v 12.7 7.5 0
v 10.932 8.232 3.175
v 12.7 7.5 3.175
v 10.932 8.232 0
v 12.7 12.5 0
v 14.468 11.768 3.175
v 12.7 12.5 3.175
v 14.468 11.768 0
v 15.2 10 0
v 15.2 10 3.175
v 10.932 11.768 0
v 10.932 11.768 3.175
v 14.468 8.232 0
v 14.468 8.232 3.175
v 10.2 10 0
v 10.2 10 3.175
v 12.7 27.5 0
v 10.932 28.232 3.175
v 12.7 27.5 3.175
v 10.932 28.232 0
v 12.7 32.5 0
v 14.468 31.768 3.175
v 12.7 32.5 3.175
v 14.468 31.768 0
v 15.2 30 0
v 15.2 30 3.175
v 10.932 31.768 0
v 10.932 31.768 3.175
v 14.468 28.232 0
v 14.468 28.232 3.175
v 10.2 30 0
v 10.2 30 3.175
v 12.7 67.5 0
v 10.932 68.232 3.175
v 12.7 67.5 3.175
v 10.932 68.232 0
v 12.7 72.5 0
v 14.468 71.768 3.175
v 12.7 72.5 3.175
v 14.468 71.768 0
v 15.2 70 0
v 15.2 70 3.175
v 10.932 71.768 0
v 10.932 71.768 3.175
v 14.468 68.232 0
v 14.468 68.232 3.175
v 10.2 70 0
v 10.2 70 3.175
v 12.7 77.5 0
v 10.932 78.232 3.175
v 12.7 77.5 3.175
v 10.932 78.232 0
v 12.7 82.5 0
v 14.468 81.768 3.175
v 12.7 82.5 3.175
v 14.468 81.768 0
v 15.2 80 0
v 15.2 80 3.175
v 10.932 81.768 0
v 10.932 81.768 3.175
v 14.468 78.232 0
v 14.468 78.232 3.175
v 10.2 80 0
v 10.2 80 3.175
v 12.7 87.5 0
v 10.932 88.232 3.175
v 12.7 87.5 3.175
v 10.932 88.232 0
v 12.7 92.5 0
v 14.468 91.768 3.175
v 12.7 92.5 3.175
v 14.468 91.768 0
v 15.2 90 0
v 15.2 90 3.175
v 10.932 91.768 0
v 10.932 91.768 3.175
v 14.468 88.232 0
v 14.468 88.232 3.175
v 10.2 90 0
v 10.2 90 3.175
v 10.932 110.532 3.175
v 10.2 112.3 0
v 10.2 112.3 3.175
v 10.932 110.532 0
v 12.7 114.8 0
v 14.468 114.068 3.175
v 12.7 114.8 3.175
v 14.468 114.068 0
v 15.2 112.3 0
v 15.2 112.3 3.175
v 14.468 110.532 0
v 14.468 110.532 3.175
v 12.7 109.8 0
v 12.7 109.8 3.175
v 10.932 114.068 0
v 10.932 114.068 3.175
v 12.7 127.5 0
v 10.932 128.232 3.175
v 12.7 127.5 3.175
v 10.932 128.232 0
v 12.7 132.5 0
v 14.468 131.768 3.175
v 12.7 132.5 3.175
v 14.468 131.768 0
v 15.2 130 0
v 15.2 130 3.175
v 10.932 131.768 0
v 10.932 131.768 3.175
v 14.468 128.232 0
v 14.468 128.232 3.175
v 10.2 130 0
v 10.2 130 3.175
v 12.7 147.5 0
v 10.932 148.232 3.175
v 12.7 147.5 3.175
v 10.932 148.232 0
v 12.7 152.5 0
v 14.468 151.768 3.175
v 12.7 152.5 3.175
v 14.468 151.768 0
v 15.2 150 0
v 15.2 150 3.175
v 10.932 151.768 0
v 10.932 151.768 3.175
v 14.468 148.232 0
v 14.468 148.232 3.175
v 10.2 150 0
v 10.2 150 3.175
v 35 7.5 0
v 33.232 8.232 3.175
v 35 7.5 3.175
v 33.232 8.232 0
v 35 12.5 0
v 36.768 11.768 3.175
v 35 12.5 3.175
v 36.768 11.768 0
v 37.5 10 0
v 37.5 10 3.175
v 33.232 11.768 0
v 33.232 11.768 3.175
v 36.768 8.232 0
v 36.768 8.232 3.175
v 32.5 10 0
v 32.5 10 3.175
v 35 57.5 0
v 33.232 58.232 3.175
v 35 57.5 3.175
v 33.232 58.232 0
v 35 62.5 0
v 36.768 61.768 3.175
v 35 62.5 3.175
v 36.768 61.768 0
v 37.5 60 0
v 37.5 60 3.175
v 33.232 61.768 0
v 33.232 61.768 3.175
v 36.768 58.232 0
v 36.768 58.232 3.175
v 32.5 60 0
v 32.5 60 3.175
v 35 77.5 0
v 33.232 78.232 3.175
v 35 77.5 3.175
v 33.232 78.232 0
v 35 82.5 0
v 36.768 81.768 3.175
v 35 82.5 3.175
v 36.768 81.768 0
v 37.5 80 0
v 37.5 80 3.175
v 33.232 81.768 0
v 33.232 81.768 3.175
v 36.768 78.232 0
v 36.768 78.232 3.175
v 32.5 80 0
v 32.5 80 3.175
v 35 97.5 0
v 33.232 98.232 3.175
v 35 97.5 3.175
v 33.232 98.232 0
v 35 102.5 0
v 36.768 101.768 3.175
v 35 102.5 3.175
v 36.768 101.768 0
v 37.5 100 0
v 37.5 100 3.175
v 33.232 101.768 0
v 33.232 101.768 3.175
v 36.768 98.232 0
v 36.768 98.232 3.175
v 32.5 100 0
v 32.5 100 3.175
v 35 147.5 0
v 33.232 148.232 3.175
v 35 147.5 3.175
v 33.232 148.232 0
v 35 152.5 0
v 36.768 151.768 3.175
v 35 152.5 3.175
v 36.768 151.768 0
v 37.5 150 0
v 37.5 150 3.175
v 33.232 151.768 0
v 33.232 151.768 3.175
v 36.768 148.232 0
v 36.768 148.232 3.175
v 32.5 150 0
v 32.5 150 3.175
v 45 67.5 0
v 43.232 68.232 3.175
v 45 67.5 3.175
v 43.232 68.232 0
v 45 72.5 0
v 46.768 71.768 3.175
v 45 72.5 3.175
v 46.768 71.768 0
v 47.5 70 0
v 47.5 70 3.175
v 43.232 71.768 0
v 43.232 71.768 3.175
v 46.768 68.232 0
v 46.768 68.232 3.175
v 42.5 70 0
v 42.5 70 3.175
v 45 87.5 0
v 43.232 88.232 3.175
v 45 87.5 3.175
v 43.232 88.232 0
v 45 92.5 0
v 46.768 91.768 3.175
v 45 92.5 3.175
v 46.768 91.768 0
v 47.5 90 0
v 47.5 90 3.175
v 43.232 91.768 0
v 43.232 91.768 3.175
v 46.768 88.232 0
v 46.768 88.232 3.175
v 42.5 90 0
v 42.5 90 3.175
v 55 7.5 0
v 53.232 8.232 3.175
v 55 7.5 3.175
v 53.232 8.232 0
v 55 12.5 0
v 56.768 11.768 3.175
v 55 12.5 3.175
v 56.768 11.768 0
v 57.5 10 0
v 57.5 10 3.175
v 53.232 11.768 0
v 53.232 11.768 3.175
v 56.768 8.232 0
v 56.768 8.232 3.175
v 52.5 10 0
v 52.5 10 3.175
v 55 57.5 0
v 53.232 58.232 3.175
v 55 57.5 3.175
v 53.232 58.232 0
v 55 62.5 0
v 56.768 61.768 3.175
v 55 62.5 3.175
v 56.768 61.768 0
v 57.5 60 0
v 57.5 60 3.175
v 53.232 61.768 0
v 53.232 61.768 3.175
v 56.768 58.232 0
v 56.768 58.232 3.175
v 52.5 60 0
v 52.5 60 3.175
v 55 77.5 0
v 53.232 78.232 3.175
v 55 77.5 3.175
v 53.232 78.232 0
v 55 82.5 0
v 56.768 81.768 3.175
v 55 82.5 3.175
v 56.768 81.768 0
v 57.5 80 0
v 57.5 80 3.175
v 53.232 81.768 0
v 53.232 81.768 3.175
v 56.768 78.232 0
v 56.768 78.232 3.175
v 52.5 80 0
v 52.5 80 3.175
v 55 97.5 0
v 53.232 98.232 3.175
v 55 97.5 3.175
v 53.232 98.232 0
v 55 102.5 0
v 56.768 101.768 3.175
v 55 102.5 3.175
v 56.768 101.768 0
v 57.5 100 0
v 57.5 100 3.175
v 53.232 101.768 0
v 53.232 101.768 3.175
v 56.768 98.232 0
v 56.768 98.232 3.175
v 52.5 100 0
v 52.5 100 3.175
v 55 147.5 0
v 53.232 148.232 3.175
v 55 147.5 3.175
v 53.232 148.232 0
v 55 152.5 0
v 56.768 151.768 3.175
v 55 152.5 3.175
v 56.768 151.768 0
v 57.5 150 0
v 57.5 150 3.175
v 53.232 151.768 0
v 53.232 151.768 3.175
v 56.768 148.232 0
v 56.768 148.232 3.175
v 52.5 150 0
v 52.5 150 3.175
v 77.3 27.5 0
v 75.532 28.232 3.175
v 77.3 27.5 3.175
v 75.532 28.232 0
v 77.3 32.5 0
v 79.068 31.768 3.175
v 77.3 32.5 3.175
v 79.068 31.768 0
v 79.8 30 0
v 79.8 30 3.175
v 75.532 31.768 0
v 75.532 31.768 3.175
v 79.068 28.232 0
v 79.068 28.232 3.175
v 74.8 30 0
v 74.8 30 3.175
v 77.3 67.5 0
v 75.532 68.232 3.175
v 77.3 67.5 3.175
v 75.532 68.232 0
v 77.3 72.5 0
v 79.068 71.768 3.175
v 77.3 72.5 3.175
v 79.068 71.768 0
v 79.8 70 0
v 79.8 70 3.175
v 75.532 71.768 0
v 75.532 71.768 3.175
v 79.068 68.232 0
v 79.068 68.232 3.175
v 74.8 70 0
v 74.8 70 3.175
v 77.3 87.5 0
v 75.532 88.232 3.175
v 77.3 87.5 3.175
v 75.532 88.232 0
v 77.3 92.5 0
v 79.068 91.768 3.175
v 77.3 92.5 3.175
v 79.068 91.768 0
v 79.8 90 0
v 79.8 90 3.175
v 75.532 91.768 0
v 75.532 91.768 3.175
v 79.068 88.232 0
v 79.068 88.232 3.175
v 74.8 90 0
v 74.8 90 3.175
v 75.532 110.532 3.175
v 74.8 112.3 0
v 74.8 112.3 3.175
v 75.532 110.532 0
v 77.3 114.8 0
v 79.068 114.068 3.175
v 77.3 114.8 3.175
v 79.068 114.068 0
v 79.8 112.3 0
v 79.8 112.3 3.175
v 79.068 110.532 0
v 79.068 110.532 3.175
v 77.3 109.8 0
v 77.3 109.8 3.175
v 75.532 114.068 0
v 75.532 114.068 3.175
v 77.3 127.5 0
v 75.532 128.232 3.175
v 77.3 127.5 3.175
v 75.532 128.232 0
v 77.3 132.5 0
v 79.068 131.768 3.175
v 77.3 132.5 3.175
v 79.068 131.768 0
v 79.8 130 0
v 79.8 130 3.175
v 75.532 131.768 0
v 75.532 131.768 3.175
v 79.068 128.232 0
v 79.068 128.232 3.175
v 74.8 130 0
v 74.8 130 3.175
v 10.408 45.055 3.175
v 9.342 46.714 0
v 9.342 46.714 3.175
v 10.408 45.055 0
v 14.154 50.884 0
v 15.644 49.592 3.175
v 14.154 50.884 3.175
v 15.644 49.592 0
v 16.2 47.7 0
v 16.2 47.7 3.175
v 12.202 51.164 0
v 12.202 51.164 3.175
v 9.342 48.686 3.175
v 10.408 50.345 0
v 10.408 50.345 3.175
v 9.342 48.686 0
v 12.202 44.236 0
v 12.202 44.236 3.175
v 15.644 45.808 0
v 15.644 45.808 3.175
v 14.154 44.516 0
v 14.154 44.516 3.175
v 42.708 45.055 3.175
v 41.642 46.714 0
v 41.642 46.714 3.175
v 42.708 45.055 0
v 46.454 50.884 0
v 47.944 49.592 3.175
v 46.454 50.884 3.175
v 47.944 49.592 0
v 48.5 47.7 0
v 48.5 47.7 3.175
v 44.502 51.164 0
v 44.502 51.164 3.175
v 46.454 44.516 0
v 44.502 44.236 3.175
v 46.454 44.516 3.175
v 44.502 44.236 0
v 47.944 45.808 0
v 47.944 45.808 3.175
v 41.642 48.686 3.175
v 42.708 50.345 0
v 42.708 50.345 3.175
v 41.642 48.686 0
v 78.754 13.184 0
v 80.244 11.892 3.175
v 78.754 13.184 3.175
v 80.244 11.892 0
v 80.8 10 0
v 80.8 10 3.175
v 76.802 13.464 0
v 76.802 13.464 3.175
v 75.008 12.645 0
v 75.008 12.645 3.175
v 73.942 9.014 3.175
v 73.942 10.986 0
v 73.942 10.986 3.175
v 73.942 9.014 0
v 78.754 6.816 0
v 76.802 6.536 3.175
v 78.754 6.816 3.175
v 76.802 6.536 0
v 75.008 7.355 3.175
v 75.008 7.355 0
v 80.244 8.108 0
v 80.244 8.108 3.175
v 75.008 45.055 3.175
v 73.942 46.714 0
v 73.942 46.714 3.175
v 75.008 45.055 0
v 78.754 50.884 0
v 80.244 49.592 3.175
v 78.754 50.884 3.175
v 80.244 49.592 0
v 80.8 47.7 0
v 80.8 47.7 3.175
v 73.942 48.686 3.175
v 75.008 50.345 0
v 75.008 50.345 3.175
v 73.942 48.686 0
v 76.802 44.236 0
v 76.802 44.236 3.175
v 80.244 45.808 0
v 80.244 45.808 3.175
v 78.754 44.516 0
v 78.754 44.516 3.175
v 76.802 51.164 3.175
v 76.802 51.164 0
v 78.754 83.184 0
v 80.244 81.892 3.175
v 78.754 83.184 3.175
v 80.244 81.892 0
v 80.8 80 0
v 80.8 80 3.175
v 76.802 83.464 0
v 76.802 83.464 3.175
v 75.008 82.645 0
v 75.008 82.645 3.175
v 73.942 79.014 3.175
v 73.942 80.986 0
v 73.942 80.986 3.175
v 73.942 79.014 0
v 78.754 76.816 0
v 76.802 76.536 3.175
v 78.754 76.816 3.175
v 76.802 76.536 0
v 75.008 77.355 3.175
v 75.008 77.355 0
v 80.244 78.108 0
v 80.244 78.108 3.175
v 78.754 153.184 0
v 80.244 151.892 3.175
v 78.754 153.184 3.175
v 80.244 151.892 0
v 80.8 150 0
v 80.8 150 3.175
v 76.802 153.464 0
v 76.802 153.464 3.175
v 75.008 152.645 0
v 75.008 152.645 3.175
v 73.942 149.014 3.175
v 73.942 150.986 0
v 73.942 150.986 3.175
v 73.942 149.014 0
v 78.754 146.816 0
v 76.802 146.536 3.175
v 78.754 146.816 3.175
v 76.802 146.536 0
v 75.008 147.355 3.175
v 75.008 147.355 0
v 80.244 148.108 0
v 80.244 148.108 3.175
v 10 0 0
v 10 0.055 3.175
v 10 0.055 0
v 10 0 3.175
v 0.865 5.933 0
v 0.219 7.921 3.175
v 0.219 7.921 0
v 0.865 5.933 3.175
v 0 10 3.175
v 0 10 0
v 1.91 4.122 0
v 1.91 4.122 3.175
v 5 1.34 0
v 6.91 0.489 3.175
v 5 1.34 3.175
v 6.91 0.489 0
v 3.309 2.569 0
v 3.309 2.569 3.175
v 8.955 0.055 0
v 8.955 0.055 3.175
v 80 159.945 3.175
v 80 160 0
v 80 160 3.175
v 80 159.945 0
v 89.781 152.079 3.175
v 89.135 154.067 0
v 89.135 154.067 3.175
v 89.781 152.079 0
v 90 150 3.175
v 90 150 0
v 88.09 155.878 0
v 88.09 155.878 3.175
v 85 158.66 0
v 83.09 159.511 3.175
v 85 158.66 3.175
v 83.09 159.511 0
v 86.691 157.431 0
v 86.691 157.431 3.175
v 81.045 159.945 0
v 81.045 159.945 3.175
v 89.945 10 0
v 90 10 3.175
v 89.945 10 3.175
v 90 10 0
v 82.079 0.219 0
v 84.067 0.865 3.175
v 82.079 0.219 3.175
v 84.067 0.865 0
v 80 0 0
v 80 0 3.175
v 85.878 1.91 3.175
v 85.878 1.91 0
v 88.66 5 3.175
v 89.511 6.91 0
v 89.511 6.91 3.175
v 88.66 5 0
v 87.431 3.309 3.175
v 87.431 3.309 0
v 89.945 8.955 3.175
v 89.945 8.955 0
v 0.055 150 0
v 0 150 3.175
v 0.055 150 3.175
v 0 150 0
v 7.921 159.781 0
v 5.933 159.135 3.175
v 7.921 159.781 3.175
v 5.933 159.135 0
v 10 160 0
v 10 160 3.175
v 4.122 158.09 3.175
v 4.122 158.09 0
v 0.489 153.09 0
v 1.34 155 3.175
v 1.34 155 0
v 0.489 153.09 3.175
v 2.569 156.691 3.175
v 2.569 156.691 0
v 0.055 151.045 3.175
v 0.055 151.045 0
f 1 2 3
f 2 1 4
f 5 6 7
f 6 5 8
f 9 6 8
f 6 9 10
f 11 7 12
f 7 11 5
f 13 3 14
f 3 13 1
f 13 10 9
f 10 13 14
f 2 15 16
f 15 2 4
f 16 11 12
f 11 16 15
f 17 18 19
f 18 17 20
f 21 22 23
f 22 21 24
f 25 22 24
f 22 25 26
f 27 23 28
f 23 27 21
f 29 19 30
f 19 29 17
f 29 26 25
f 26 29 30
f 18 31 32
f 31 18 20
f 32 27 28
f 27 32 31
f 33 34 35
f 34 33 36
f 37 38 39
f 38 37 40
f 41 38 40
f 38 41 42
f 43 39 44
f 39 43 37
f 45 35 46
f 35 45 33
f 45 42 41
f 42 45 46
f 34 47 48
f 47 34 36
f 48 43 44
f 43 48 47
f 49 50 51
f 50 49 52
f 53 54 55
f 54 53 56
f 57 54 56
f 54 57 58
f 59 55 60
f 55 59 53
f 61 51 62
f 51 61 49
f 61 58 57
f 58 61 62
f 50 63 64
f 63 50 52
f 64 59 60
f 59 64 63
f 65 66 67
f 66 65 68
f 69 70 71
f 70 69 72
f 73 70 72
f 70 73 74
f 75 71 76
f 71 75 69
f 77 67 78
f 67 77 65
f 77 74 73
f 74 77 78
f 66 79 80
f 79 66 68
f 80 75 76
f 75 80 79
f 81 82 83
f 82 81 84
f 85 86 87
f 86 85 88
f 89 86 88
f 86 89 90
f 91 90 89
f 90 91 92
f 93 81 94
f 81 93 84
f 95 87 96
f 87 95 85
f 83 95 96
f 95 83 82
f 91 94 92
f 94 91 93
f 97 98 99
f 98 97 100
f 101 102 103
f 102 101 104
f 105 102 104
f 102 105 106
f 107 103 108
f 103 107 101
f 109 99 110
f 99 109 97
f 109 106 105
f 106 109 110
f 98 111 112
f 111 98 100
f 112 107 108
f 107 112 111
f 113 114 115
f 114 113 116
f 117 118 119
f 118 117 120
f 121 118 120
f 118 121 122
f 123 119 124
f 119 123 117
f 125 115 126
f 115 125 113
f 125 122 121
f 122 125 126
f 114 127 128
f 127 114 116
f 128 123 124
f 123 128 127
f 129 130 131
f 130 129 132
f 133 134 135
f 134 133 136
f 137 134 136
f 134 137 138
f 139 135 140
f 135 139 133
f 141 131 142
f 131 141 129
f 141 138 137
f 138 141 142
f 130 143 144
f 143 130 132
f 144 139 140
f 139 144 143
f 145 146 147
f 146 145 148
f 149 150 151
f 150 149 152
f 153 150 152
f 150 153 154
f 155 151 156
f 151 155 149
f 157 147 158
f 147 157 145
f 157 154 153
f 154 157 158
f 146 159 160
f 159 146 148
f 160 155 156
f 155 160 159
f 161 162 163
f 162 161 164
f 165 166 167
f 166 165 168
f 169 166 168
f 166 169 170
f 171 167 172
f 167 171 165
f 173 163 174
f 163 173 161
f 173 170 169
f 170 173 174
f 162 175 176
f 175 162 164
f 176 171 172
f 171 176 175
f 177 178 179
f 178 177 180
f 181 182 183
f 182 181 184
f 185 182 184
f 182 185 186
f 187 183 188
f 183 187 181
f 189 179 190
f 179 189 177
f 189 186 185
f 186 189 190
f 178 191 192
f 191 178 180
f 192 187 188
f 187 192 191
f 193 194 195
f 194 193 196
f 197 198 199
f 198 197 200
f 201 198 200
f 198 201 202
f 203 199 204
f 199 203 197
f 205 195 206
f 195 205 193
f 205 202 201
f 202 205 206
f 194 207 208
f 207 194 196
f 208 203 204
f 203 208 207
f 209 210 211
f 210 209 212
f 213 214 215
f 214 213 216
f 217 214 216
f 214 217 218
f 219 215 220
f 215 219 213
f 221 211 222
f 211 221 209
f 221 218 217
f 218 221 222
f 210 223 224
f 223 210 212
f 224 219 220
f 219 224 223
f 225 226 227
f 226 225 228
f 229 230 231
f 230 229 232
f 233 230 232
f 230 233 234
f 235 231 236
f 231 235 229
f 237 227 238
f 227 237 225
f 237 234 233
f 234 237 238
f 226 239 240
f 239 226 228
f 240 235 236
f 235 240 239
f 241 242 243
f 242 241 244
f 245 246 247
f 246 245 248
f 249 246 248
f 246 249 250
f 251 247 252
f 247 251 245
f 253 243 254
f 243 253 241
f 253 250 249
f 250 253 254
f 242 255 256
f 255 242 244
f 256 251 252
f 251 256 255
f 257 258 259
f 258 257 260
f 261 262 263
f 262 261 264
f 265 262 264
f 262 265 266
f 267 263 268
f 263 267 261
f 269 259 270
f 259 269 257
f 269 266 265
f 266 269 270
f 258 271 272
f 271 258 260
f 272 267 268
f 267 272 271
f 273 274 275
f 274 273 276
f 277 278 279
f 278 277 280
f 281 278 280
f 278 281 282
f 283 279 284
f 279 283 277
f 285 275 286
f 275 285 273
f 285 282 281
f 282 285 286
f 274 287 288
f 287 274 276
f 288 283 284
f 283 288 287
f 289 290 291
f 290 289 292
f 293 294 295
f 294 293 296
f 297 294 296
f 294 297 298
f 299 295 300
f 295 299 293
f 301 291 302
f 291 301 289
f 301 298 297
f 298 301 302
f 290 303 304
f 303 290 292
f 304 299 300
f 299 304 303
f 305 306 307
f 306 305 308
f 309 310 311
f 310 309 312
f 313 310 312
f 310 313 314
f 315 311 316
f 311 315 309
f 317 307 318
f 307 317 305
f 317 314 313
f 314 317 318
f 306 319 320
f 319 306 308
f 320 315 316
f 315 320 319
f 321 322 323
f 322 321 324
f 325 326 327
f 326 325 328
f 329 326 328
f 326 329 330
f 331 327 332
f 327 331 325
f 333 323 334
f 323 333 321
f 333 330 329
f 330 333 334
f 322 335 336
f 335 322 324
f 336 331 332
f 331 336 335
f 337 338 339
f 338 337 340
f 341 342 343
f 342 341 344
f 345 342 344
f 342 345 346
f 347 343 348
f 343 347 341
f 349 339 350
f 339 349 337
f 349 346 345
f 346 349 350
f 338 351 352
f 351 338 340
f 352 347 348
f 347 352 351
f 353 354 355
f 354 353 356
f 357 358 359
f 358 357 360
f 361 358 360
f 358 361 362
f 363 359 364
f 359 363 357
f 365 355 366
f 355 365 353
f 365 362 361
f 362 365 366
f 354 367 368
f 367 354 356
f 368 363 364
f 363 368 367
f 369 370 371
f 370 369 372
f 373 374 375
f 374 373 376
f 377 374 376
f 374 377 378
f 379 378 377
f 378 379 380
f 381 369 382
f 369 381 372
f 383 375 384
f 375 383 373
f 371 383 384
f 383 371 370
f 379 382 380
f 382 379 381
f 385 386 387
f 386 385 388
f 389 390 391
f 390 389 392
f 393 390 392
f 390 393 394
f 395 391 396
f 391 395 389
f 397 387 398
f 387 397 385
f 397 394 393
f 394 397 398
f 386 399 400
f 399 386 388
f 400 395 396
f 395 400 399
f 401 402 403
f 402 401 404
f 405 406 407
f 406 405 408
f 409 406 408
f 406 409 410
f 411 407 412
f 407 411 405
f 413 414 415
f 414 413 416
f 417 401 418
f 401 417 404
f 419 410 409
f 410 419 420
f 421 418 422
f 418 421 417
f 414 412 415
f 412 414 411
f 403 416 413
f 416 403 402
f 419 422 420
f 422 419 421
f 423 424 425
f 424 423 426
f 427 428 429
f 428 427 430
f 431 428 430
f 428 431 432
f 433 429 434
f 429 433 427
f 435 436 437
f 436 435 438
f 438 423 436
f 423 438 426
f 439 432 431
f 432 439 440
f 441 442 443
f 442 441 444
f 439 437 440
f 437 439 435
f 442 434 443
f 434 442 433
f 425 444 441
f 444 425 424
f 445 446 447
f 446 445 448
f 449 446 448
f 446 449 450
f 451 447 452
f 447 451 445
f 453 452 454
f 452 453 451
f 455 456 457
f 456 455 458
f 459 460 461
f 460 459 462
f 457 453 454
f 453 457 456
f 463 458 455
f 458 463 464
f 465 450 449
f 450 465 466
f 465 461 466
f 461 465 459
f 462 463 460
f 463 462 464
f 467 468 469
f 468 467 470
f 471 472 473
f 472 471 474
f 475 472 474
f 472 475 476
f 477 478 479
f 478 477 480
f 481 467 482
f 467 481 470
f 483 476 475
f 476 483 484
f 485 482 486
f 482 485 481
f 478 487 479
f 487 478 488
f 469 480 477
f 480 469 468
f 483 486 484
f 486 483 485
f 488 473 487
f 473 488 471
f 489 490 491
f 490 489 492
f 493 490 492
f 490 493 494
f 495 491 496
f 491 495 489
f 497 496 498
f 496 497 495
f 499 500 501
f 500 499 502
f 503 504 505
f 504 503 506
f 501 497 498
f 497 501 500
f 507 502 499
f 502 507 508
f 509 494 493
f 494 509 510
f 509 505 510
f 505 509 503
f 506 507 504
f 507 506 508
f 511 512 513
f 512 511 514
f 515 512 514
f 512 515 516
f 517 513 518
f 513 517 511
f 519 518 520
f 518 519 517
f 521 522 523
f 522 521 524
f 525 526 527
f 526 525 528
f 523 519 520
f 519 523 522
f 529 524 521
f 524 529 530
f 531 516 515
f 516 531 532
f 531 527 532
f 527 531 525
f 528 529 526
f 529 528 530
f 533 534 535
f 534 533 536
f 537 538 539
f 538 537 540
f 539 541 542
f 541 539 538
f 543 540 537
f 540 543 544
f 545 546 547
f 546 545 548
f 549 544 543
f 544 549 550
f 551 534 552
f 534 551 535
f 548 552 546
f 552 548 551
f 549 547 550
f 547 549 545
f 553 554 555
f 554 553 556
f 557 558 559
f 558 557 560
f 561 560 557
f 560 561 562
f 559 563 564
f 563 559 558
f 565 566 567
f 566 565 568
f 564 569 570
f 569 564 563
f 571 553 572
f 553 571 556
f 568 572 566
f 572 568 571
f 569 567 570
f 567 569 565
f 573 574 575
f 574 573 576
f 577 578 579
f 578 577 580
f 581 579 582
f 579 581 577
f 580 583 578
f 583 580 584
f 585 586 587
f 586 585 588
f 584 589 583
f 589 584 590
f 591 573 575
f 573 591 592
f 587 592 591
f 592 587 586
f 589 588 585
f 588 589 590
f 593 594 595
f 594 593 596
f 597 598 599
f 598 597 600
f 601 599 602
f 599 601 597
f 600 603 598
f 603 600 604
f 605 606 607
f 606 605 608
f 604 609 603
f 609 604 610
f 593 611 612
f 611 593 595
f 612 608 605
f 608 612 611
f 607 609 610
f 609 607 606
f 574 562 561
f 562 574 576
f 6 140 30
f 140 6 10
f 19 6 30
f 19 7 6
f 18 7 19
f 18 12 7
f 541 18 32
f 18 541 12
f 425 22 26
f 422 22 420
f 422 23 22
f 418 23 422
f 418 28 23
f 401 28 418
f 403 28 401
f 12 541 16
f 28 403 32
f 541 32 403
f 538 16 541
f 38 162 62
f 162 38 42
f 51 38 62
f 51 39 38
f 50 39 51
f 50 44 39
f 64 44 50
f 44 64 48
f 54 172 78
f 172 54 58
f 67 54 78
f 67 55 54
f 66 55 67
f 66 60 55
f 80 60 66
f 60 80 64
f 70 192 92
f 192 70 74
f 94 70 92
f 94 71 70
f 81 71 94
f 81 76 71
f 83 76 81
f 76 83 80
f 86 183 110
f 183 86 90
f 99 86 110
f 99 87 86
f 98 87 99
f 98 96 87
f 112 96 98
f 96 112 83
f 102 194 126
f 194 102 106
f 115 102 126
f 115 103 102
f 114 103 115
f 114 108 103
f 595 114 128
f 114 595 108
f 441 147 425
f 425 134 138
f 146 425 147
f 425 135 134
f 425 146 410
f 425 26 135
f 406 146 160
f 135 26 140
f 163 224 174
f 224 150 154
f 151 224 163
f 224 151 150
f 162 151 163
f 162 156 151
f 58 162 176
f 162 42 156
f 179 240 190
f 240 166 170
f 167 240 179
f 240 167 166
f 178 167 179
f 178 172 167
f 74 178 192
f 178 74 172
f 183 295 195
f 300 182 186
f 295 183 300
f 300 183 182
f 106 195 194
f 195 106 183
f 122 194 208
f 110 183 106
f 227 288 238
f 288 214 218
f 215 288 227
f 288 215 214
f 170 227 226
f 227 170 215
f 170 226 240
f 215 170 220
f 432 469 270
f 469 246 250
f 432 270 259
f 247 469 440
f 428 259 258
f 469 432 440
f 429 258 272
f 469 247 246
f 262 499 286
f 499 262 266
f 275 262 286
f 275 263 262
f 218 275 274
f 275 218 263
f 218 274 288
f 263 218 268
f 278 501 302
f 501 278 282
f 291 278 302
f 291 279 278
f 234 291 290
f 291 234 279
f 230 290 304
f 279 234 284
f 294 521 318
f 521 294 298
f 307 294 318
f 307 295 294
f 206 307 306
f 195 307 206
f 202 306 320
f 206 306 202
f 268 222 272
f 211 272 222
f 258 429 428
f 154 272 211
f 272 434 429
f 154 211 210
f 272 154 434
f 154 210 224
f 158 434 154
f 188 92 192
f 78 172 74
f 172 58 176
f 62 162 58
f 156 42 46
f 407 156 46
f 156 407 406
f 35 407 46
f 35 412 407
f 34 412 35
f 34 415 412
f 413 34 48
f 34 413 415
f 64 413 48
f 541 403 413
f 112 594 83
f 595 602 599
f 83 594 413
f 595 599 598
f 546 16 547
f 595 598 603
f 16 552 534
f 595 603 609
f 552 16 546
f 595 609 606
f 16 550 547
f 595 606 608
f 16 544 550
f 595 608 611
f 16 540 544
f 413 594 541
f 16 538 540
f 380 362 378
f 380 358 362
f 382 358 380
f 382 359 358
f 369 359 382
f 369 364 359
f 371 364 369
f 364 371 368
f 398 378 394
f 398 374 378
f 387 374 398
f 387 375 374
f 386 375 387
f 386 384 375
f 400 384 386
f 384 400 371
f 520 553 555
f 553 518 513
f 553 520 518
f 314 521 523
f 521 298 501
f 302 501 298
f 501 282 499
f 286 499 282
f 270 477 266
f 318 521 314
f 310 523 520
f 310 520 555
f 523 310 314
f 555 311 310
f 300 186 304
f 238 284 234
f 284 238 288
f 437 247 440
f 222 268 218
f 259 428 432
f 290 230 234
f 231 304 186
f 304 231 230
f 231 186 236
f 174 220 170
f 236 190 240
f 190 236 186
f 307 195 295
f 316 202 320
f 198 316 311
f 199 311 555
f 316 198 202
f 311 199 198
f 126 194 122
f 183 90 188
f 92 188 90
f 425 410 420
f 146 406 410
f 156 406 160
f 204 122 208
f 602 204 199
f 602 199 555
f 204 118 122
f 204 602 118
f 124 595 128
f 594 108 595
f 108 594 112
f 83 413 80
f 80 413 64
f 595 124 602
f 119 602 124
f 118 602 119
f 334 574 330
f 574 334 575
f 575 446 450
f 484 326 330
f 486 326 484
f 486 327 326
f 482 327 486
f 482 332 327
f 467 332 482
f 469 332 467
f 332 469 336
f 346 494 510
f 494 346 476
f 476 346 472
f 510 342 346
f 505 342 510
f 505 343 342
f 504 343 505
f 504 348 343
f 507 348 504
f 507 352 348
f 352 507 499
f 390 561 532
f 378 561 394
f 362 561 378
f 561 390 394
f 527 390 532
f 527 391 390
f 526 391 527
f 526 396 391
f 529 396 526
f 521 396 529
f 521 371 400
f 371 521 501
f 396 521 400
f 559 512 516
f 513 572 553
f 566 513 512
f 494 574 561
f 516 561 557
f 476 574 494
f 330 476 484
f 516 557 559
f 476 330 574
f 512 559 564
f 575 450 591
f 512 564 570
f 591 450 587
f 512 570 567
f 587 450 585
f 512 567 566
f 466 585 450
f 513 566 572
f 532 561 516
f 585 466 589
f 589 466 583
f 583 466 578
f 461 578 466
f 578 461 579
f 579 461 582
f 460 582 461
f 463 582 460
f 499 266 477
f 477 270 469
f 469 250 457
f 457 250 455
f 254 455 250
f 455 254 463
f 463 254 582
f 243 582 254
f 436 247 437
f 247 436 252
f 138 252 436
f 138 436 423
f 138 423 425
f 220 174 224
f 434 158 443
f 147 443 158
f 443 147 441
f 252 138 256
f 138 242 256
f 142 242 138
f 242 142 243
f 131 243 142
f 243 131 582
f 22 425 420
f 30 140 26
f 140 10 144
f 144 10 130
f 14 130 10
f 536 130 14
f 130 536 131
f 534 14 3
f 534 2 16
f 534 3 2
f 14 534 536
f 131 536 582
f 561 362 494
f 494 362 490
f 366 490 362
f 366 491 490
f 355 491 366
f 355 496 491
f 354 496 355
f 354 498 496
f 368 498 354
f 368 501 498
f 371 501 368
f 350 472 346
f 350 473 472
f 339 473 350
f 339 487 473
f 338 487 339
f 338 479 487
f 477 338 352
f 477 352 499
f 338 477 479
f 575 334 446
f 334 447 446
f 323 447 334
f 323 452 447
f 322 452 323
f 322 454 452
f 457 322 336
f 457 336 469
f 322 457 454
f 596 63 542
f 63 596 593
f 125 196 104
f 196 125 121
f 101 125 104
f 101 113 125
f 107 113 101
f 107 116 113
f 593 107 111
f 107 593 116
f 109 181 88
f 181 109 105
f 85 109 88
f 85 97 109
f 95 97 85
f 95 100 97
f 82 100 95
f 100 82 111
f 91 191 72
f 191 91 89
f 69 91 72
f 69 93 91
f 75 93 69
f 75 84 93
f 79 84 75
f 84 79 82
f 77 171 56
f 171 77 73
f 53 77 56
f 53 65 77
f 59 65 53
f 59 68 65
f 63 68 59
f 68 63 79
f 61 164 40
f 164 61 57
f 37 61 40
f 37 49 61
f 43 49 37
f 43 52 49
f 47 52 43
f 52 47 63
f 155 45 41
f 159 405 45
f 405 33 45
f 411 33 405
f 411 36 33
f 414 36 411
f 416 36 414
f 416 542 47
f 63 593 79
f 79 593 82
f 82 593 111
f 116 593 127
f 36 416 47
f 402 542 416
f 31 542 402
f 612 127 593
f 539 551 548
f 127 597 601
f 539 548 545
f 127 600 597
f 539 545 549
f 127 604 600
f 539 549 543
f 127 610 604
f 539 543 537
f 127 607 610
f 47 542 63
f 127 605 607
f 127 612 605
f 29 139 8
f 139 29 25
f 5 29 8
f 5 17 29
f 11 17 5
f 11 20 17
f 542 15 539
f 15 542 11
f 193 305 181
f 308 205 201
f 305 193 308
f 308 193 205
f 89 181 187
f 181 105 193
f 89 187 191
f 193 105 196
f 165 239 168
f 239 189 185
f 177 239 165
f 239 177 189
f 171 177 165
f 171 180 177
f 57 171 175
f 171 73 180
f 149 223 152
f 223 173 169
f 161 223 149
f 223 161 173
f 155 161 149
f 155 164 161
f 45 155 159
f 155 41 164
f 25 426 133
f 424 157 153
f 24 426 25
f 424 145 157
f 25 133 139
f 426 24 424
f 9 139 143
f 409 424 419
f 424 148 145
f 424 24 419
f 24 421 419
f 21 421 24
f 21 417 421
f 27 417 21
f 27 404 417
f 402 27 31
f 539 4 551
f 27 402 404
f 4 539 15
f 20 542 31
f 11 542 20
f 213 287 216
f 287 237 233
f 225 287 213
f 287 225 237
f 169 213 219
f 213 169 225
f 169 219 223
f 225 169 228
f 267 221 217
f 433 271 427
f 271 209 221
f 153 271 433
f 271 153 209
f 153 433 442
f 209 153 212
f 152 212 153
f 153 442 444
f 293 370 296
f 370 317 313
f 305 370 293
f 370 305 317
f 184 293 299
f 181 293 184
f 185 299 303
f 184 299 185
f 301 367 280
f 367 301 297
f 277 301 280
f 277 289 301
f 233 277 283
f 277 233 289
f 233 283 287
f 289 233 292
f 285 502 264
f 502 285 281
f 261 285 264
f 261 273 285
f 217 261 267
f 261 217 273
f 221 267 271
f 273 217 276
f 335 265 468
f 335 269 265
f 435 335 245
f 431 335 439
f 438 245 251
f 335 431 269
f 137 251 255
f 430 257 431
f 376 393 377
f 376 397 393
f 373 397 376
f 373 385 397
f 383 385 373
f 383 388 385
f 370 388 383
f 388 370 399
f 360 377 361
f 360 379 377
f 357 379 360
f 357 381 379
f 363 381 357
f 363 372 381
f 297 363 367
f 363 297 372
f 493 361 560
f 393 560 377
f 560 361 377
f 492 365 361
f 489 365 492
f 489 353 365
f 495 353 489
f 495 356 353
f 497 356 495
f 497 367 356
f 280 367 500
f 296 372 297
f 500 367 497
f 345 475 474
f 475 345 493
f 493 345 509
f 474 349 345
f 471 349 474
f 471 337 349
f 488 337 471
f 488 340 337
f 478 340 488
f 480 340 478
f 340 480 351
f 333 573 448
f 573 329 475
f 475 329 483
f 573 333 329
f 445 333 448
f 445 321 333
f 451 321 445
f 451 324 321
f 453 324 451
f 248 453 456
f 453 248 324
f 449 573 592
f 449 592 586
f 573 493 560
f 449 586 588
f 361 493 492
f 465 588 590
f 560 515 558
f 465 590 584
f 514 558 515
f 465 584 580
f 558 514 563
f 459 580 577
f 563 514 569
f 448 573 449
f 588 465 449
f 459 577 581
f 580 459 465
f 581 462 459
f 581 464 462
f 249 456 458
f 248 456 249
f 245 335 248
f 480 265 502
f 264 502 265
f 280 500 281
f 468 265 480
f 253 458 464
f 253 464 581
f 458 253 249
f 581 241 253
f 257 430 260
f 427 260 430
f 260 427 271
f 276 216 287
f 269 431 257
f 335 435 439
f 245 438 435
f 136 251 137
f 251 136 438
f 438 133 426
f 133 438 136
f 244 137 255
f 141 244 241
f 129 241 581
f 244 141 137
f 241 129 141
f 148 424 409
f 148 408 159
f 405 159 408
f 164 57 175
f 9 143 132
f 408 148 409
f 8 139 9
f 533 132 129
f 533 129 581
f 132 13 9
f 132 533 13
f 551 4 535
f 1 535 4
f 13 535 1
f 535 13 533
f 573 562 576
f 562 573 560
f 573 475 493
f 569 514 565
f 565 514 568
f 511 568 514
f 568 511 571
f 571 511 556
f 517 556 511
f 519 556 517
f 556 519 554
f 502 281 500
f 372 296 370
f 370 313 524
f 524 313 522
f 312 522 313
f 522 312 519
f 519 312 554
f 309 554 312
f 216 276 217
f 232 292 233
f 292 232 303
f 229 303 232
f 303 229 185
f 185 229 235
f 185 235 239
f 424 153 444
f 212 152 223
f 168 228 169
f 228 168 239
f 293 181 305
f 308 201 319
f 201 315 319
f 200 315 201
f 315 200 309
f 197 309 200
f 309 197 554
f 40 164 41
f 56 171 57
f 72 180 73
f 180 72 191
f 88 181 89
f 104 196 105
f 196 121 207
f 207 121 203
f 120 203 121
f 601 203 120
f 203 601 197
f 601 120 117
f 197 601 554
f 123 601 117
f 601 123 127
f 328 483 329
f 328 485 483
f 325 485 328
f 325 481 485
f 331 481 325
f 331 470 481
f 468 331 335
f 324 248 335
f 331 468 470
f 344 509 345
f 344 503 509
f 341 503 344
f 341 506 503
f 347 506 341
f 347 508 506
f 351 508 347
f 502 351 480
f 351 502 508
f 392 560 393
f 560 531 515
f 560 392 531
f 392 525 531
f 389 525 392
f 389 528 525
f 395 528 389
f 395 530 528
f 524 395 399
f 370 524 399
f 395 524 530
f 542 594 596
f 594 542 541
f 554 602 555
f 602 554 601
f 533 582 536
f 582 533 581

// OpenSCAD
// MakerSlide Component
// http://www.makerslide.com
// c14005_rev_2
// Standard Wheel Carriage Plate
// Original by Barton Dring
// OpenSCAD model by Mike Sheldrake

standard_wheel_carriage_plate();

module standard_wheel_carriage_plate(thickness=3.175) {
color([175/255,178/255,183/255])
difference() {

// 90mm by 160mm plate 
// 3.175mm thick by default,
// but you can pass a different thickness to this module
cube([90,160,3.175],center=false);

// 5mm diam. holes
for(i=[
  [12.7,10],
  [12.7,30],
  [12.7,70],
  [12.7,80],
  [12.7,90],
  [12.7,112.3],
  [12.7,130],
  [12.7,150],
  [35,10],
  [35,60],
  [35,80],
  [35,100],
  [35,150],
  [45,70],
  [45,90],
  [55,10],
  [55,60],
  [55,80],
  [55,100],
  [55,150],
  [77.3,30],
  [77.3,70],
  [77.3,90],
  [77.3,112.3],
  [77.3,130],

  //These are 5mm holes in the 7mm hole spots that we will do next.
  //For some reason including them here too makes the OpenCSG display look right.
  //Not needed for CGAL render though.
  [12.7,47.7],
  [45,47.7],
  [77.3,10],
  [77.3,47.7],
  [77.3,80],
  [77.3,150]

  ]) { translate([i[0],i[1],-0.2]) cylinder(h=thickness+1,r=5/2,center=false); }

// 7mm diam. holes 
for(i=[
  [12.7,47.7],
  [45,47.7],
  [77.3,10],
  [77.3,47.7],
  [77.3,80],
  [77.3,150]
  ]) { translate([i[0],i[1],-0.2]) cylinder(h=thickness+1,r=7/2,center=false); }

// rounded corners on plate 
for(i=[
  [0,0,0],
  [90,160,180],
  [90,0,90],
  [0,160,270]
  ]
  ) {
	translate([i[0],i[1],0]) rotate(a=[0,0,i[2]]) translate([10,10,-0.1]) rotate(a=[0,0,180]) difference() {
		cube([11,11,thickness+1],center=false);
		translate([0,0,-0.1]) cylinder(h=thickness+2,r=10,center=false);
		}
	}
}
}
